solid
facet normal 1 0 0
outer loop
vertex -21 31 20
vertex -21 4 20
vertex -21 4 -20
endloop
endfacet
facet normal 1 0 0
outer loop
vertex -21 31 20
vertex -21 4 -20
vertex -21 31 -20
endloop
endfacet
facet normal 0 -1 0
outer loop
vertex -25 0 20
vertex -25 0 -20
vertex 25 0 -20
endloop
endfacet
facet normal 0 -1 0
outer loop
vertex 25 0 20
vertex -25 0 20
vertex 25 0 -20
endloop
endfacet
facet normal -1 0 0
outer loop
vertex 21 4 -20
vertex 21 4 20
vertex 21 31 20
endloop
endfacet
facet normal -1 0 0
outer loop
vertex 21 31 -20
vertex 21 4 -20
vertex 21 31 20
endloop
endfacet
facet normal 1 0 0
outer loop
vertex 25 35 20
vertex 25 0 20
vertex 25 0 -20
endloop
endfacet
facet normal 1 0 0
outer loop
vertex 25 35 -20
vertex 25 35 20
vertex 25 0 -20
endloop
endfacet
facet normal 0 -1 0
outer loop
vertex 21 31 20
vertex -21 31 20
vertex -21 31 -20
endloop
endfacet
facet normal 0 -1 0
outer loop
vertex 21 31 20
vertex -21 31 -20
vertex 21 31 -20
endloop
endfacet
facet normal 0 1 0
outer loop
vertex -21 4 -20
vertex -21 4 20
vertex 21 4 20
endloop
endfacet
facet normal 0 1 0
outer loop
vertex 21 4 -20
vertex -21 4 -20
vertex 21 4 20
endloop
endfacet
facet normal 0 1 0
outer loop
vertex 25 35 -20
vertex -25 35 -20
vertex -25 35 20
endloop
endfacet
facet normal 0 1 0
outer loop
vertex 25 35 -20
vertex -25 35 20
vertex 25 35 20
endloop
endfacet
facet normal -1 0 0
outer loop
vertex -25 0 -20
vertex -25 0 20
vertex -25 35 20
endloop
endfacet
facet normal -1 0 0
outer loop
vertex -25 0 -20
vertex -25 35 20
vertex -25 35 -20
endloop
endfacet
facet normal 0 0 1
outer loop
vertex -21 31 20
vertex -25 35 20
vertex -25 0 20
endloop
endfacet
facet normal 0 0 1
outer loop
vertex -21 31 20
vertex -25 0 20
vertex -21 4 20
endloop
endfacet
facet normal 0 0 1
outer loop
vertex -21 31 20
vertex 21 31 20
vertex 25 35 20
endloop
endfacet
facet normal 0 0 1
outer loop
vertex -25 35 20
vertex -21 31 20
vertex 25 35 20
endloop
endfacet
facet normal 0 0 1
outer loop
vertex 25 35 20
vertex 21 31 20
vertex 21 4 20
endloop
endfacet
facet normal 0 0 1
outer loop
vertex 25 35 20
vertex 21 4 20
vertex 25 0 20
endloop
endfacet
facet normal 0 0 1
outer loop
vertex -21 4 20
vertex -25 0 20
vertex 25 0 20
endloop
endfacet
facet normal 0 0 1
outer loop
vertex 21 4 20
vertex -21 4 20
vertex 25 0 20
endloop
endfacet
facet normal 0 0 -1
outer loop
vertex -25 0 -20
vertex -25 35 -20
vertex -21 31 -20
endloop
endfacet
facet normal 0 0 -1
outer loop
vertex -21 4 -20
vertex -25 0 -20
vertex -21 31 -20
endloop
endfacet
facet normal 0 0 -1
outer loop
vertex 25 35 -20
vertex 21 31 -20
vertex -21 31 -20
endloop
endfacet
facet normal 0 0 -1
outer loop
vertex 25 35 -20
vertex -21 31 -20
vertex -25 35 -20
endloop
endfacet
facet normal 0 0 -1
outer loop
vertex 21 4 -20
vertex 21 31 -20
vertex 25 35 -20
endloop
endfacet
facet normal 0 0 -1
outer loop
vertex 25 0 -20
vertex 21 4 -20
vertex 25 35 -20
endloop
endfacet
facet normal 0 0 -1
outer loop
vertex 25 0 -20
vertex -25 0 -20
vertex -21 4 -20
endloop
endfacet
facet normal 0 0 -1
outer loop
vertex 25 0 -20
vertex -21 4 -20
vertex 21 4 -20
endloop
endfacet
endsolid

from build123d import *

# Parameters (mm, degrees)
SKETCH1_W           = 50
SKETCH1_H           = 40
BOSS_EXTRUDE1_DEPTH = 35
SKETCH2_W           = 42
SKETCH2_H           = 27
CUT_EXTRUDE1_DEPTH  = 59.736700622


with BuildPart() as part:
    # Sketch1 → Boss-Extrude1 (new body)
    with BuildSketch(Plane(origin=(0, 0, 0), x_dir=(1, 0, 0), z_dir=(0, 1, 0))):
        Rectangle(SKETCH1_W, SKETCH1_H)
    extrude(amount=BOSS_EXTRUDE1_DEPTH)

    # Sketch2 → Cut-Extrude1 (cut, through all)
    with BuildSketch(Plane.XY.offset(20)):
        with Locations((0, 17.5)):
            Rectangle(SKETCH2_W, SKETCH2_H)
    extrude(amount=-CUT_EXTRUDE1_DEPTH, mode=Mode.SUBTRACT)


solid = part.part
